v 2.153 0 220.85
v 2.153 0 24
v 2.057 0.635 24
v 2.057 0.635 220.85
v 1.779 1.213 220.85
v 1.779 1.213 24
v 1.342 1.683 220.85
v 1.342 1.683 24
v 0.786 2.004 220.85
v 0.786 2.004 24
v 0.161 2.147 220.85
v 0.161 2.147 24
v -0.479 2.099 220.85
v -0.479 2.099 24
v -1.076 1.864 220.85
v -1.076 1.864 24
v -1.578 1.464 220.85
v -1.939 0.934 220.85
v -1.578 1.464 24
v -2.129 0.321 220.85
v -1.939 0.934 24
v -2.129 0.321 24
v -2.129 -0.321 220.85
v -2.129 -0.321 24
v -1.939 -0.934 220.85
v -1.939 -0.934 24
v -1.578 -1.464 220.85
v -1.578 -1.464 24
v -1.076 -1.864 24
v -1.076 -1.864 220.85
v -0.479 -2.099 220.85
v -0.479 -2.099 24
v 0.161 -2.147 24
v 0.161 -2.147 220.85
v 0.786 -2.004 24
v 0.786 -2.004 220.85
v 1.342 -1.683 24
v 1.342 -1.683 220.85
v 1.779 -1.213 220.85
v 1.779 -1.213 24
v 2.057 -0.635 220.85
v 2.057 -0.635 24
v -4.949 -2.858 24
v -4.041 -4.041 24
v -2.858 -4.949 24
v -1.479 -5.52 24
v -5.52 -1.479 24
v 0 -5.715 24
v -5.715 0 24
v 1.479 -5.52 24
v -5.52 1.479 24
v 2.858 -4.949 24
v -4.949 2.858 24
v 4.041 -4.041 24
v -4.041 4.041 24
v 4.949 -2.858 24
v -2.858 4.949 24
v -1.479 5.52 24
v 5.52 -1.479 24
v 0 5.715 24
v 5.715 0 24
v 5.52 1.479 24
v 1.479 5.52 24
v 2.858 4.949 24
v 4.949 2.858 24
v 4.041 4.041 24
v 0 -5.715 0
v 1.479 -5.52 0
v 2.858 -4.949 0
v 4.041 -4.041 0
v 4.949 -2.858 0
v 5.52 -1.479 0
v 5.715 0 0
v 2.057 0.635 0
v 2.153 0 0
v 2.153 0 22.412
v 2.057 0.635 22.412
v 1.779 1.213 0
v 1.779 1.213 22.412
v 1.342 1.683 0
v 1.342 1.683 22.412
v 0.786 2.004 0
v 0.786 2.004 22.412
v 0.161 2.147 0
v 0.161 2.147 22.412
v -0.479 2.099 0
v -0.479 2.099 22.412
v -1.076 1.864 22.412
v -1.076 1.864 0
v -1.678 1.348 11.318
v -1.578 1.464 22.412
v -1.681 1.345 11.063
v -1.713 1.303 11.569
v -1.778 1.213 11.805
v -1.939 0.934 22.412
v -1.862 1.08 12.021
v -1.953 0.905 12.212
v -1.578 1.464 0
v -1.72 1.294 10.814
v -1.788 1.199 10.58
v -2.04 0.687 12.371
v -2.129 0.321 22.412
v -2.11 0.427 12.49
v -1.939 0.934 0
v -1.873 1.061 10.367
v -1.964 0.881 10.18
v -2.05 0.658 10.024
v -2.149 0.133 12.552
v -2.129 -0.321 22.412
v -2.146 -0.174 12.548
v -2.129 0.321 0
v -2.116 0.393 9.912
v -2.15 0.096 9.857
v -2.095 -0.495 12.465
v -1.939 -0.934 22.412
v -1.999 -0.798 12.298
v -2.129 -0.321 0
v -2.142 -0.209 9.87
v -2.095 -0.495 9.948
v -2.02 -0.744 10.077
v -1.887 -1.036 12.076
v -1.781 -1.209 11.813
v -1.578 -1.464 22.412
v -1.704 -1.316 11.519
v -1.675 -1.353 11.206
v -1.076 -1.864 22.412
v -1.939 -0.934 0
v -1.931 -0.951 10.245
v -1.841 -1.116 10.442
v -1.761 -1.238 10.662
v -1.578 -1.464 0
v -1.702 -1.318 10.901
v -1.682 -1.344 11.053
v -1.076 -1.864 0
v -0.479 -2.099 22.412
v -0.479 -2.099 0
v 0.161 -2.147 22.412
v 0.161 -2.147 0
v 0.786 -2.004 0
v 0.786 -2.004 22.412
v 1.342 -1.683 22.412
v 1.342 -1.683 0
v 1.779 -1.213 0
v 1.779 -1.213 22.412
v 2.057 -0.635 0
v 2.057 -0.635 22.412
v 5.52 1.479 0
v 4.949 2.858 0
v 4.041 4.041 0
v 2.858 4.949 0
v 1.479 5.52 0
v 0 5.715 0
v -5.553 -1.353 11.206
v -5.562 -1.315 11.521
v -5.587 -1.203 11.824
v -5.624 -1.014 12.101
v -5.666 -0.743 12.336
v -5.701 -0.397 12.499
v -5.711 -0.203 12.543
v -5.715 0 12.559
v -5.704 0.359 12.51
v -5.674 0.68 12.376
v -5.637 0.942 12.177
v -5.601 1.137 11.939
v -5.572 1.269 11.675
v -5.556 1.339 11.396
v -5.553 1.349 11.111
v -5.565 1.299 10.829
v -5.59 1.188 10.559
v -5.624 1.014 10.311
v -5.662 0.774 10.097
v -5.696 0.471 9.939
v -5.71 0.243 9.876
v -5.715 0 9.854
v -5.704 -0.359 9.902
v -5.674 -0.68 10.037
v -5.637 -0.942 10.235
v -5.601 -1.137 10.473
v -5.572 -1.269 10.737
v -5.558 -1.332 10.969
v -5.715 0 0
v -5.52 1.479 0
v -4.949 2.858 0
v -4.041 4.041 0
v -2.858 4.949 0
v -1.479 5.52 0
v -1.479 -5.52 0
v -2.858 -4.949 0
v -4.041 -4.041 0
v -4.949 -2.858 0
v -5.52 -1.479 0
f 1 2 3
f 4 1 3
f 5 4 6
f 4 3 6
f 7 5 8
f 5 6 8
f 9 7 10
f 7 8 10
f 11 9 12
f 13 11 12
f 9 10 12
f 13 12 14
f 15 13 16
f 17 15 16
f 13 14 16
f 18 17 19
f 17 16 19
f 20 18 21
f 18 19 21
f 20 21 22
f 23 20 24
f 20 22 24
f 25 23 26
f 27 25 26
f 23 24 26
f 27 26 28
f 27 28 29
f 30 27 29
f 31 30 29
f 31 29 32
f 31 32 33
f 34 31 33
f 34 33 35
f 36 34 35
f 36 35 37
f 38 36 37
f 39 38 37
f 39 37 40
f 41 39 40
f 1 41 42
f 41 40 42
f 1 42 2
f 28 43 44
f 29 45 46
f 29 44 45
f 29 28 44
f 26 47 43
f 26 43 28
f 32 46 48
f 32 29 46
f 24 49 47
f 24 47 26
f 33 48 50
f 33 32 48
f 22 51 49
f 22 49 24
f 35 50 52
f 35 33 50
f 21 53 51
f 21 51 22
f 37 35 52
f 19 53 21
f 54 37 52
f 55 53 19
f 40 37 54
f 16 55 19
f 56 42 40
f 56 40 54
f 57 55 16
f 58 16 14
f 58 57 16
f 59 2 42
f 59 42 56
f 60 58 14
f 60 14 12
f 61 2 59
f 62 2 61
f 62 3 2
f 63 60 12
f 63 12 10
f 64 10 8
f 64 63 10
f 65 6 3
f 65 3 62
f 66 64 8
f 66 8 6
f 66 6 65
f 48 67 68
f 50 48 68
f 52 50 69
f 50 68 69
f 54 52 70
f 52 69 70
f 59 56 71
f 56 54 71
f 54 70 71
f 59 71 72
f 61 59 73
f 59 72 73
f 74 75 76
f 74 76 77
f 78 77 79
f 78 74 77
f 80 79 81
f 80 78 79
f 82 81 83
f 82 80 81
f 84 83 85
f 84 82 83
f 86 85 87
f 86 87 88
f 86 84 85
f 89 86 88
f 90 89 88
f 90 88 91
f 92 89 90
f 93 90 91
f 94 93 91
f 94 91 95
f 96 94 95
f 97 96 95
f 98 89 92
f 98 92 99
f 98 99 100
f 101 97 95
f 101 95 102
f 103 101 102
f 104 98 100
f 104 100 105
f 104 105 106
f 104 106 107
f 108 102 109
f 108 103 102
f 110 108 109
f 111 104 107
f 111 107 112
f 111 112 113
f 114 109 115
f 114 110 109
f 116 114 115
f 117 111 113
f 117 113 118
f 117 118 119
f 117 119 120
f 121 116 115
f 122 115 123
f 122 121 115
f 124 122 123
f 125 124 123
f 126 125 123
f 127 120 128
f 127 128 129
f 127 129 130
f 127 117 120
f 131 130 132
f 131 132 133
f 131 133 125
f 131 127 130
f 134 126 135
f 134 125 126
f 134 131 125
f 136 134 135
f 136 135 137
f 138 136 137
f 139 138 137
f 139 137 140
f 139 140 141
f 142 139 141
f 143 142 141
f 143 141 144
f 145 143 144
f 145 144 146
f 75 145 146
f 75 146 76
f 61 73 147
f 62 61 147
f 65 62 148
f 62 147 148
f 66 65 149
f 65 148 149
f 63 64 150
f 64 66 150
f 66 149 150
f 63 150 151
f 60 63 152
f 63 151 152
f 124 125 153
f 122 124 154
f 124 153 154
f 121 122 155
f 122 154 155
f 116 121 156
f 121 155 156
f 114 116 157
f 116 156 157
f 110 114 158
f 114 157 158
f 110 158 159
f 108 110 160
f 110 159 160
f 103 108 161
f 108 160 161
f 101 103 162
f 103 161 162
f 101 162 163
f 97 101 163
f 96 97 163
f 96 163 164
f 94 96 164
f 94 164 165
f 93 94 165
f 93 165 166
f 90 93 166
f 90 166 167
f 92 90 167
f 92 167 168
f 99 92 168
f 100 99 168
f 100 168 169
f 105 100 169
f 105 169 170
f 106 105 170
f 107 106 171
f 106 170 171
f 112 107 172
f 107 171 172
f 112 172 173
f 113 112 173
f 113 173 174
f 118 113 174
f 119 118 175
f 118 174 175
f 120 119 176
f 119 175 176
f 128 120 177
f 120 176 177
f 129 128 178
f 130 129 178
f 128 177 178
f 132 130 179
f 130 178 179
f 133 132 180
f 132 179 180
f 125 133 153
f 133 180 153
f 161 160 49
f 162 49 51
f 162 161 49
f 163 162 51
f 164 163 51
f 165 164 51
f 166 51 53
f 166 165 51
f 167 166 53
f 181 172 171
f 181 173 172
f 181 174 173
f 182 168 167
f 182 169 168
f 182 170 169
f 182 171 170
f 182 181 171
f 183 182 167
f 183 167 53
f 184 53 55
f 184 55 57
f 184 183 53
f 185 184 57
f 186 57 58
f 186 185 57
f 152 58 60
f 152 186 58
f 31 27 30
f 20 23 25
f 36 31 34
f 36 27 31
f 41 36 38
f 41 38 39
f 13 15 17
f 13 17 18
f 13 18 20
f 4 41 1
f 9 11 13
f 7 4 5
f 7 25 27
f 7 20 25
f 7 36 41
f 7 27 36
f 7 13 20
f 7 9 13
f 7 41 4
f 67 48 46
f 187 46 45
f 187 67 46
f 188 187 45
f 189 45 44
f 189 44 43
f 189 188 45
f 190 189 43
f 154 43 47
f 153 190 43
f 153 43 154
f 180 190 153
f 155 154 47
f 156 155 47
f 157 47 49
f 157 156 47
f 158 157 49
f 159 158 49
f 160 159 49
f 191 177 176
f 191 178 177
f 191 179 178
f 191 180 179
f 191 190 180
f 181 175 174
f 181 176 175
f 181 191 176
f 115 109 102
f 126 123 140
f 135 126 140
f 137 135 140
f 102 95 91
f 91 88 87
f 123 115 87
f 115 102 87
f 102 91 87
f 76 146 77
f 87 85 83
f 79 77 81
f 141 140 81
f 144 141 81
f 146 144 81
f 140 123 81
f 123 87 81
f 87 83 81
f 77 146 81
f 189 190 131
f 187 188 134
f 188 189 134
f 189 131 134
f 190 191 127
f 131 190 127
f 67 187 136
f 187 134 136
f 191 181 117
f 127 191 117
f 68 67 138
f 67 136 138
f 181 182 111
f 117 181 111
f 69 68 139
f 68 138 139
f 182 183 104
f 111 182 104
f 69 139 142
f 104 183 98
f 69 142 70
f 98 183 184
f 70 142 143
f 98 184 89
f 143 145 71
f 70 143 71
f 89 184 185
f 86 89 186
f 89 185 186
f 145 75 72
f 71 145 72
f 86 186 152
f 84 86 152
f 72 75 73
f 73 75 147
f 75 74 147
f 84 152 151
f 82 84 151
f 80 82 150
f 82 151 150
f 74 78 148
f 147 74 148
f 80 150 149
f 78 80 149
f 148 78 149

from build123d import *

# Parameters (mm, degrees)
F0_W        = 11.43
F0_H        = 11.43
F0_R        = 2.15265
F1_DEPTH    = 22.4125
F2_W        = 11.43
F2_H        = 11.43
F3_DEPTH    = 1.5875
F4_R        = 1.35255
F5_REACH    = 15.2565891076
F6_T1_DEPTH = 52.575
F7_R        = 2.15265
F8_DEPTH    = 196.85


# Not quite as in the source:
# - a fillet or chamfer that OpenCascade refuses, or shapes differently, is made with other operations: its cross-section is extruded or revolved along the edge and cut away or added


with BuildPart() as f1:
    # F0 (on Top) → F1 (new body)
    with BuildSketch(Plane.XY):
        Rectangle(F0_W, F0_H)
        Circle(F0_R, mode=Mode.SUBTRACT)
    extrude(amount=F1_DEPTH)

    # F2 (on face) → F3 (join)
    with BuildSketch(Plane.XY.offset(22.4125)):
        Rectangle(F2_W, F2_H)
    extrude(amount=F3_DEPTH)

    f5_end = f1.faces().sort_by_distance((-2.15265, 0, 11.20625))[0]
    # F4 (on face) → F5 (cut, up to a face of the model that its end follows)
    with BuildSketch(Plane(origin=(-5.715, 0, 0), x_dir=(0, -1, 0), z_dir=(-1, 0, 0))):
        with Locations((0, 11.20625)):
            Circle(F4_R)
    f5_long = extrude(amount=-F5_REACH, mode=Mode.PRIVATE)
    add(split(f5_long, bisect_by=f5_end, keep=Keep.ALL, mode=Mode.PRIVATE).solids().sort_by_distance((-5.715, 0, 11.20625))[0], mode=Mode.SUBTRACT)

    # F6: fillet of radius 5.715 on 4 edges, made by hand

    # F6_s2 → F6_t1 (cut)
    with BuildSketch(Plane.XY.offset(-14.2875)):
        with BuildLine():
            ThreePointArc((0, -5.715), (-4.0411152545, -4.0411152545), (-5.715, 0))
            Line((-5.715, 0), (-5.715, -5.715))
            Line((-5.715, -5.715), (0, -5.715))
        make_face()
        with BuildLine():
            ThreePointArc((0, -5.715), (4.0411152545, -4.0411152545), (5.715, 0))
            Line((5.715, 0), (5.715, -5.715))
            Line((5.715, -5.715), (0, -5.715))
        make_face()
        with BuildLine():
            ThreePointArc((-5.715, 0), (-4.0411152545, 4.0411152545), (0, 5.715))
            Line((0, 5.715), (-5.715, 5.715))
            Line((-5.715, 5.715), (-5.715, 0))
        make_face()
        with BuildLine():
            ThreePointArc((5.715, 0), (4.0411152545, 4.0411152545), (0, 5.715))
            Line((0, 5.715), (5.715, 5.715))
            Line((5.715, 5.715), (5.715, 0))
        make_face()
    extrude(amount=F6_T1_DEPTH, mode=Mode.SUBTRACT)

    # F7 (on face) → F8 (join)
    with BuildSketch(Plane.XY.offset(24)):
        Circle(F7_R)
    extrude(amount=F8_DEPTH)


solid = f1.part
